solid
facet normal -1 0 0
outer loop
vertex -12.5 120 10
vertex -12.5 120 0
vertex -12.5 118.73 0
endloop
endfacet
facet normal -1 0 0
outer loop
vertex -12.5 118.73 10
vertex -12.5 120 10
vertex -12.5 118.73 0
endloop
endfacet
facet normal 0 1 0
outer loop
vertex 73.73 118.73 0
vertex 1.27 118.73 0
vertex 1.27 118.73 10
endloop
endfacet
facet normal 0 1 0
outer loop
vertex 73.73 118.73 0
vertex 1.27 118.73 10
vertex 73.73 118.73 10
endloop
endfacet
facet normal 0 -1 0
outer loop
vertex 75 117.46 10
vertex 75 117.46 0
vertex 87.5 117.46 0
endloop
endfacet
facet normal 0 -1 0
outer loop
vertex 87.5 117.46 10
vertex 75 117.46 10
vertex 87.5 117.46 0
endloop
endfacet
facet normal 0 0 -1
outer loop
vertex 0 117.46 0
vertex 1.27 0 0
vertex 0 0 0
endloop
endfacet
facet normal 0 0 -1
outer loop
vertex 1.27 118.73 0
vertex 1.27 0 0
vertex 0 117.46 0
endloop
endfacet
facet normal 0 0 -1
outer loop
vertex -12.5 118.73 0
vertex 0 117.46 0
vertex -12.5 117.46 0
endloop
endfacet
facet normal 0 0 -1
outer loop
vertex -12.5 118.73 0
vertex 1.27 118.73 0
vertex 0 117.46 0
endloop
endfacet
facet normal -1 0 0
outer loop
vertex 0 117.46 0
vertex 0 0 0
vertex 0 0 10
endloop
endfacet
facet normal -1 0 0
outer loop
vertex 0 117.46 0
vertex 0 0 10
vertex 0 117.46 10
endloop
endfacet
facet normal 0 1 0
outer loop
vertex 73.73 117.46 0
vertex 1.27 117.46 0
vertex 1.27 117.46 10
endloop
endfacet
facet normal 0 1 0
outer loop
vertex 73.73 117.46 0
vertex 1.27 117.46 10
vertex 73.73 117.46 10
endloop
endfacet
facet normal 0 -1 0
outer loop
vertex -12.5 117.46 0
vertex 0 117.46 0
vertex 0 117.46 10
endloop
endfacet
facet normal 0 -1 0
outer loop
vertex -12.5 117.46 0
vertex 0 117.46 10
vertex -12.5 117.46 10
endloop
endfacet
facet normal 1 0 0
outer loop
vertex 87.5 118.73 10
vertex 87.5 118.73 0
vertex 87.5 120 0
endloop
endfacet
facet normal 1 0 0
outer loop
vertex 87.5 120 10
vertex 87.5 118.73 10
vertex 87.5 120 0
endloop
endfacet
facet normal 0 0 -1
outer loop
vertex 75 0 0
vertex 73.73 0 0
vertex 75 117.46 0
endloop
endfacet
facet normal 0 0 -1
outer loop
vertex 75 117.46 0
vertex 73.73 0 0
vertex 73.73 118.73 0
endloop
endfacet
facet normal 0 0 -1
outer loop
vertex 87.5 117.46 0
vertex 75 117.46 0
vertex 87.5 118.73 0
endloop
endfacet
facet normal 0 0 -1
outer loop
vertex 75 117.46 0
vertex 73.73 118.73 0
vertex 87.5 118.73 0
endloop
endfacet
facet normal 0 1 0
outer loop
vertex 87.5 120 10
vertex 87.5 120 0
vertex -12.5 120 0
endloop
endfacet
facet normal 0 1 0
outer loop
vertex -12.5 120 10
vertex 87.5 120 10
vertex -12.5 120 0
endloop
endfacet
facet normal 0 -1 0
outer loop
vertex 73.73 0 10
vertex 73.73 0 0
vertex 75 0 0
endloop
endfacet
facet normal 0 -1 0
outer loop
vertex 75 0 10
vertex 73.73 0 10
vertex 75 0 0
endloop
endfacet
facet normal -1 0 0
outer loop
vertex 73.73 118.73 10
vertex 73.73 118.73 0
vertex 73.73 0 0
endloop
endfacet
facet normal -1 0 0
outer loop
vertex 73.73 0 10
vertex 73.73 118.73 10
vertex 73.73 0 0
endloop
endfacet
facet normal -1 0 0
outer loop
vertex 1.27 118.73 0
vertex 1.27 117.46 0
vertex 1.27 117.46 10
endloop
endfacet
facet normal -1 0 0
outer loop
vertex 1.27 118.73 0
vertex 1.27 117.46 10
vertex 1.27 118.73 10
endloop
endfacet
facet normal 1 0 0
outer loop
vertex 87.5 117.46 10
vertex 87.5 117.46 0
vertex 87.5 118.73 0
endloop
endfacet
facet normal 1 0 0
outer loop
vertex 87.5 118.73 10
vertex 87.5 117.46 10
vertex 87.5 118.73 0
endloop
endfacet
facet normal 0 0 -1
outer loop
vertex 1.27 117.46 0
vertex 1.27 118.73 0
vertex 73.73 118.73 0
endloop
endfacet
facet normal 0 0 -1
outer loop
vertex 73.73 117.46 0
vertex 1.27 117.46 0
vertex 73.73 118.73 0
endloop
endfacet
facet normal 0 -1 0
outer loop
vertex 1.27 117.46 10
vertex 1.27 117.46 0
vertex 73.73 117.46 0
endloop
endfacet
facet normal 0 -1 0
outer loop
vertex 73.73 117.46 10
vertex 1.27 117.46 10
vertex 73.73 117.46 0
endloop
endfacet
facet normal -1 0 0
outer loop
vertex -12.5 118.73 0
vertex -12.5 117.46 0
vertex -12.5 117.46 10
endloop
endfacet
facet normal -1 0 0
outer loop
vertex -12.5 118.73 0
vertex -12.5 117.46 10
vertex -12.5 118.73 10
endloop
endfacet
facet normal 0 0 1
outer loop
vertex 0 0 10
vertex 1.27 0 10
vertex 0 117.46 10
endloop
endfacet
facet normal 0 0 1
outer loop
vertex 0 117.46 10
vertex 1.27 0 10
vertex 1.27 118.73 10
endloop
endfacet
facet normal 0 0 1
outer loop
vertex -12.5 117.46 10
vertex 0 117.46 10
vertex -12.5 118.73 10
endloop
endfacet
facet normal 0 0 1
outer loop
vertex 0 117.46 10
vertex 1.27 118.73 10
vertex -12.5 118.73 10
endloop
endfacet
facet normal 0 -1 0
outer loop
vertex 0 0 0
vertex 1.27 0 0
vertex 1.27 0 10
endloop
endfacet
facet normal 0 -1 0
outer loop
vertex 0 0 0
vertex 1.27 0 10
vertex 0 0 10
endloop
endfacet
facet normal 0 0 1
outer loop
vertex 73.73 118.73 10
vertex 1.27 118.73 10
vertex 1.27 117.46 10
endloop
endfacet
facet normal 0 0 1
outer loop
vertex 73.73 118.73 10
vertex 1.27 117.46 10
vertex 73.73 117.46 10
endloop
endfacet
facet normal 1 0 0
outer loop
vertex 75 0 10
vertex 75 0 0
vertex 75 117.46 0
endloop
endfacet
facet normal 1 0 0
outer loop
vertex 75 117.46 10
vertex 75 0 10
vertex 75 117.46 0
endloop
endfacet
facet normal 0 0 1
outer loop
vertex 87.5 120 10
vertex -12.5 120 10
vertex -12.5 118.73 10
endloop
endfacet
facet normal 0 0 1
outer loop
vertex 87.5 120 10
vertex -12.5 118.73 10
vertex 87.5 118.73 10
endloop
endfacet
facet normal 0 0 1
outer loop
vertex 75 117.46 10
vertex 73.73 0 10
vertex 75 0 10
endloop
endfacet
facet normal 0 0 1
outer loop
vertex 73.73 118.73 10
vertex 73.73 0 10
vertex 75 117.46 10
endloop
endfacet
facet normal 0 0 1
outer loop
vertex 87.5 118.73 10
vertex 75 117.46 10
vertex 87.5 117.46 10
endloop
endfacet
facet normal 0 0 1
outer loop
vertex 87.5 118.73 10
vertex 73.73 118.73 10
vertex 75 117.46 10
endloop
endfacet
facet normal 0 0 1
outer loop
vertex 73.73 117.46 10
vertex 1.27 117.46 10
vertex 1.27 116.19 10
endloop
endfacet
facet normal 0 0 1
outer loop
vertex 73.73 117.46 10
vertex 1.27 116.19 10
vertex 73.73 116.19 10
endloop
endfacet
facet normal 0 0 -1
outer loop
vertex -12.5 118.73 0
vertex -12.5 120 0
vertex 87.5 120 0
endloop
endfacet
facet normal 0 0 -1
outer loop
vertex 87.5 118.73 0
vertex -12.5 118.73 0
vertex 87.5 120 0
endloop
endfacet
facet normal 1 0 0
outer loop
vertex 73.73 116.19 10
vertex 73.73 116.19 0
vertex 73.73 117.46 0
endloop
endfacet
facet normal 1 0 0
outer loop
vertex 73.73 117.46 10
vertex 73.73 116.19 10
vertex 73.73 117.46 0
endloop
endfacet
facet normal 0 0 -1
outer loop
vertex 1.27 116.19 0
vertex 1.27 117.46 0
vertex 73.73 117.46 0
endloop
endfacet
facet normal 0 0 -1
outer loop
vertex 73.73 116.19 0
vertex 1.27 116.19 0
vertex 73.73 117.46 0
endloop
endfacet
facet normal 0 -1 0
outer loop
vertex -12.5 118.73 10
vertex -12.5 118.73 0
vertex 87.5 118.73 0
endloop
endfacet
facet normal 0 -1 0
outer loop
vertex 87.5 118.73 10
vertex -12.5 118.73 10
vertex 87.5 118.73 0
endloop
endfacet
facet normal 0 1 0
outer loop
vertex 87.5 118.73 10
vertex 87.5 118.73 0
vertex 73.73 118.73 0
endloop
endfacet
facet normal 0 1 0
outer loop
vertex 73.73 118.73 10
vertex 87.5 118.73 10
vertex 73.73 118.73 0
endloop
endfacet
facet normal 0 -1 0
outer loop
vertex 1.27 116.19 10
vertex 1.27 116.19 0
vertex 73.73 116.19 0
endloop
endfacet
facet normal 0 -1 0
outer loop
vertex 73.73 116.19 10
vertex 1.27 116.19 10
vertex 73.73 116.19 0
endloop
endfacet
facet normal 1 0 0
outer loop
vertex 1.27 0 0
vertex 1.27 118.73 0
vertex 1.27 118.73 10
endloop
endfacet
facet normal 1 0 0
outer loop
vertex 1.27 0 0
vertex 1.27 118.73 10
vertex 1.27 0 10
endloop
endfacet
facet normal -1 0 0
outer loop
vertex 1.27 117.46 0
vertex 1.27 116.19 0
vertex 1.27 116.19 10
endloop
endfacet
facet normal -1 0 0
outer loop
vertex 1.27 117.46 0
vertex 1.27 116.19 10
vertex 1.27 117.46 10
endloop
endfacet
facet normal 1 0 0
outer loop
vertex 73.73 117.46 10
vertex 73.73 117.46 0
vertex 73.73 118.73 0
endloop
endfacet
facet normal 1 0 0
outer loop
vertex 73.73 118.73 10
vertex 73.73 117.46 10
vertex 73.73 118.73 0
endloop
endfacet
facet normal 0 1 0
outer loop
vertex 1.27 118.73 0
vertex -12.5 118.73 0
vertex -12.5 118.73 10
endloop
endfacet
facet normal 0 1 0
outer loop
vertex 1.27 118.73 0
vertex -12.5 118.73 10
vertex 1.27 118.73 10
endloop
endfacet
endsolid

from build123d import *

# Parameters (mm, degrees)
BOSS_EXTRUDE1_DEPTH   = 10
BOSS_EXTRUDE1_2_DEPTH = 10
SKETCH2_4_W           = 72.46
SKETCH2_4_H           = 1.27
BOSS_EXTRUDE2_DEPTH   = 10
BOSS_EXTRUDE3_DEPTH   = 10
SKETCH2_7_W           = 72.46
SKETCH2_7_H           = 1.27
BOSS_EXTRUDE4_DEPTH   = 10


with BuildPart() as part:
    # Sketch2 → Boss-Extrude1 (new body)
    with BuildSketch(Plane.XY):
        Polygon((0, 117.46), (0, 0), (1.27, 0), (1.27, 118.73), (-12.5, 118.73), (-12.5, 117.46), align=None)
    extrude(amount=BOSS_EXTRUDE1_DEPTH)


with BuildPart() as body_2:
    # Sketch2 → Boss-Extrude1 2 (new body)
    with BuildSketch(Plane.XY):
        Polygon((73.73, 118.73), (73.73, 0), (75, 0), (75, 117.46), (87.5, 117.46), (87.5, 118.73), align=None)
    extrude(amount=BOSS_EXTRUDE1_2_DEPTH)


with BuildPart() as body_3:
    # Sketch2<4> → Boss-Extrude2 (new body)
    with BuildSketch(Plane.XY):
        with Locations((37.5, 118.095)):
            Rectangle(SKETCH2_4_W, SKETCH2_4_H)
    extrude(amount=BOSS_EXTRUDE2_DEPTH)


with BuildPart() as body_4:
    # Sketch2<5> → Boss-Extrude3 (new body)
    with BuildSketch(Plane.XY):
        Polygon((-12.5, 120), (-12.5, 118.73), (1.27, 118.73), (73.73, 118.73), (87.5, 118.73), (87.5, 120), align=None)
    extrude(amount=BOSS_EXTRUDE3_DEPTH)


with BuildPart() as body_5:
    # Sketch2<7> → Boss-Extrude4 (new body)
    with BuildSketch(Plane.XY):
        with Locations((37.5, 116.825)):
            Rectangle(SKETCH2_7_W, SKETCH2_7_H)
    extrude(amount=BOSS_EXTRUDE4_DEPTH)


solid = Compound([part.part, body_2.part, body_3.part, body_4.part, body_5.part])
